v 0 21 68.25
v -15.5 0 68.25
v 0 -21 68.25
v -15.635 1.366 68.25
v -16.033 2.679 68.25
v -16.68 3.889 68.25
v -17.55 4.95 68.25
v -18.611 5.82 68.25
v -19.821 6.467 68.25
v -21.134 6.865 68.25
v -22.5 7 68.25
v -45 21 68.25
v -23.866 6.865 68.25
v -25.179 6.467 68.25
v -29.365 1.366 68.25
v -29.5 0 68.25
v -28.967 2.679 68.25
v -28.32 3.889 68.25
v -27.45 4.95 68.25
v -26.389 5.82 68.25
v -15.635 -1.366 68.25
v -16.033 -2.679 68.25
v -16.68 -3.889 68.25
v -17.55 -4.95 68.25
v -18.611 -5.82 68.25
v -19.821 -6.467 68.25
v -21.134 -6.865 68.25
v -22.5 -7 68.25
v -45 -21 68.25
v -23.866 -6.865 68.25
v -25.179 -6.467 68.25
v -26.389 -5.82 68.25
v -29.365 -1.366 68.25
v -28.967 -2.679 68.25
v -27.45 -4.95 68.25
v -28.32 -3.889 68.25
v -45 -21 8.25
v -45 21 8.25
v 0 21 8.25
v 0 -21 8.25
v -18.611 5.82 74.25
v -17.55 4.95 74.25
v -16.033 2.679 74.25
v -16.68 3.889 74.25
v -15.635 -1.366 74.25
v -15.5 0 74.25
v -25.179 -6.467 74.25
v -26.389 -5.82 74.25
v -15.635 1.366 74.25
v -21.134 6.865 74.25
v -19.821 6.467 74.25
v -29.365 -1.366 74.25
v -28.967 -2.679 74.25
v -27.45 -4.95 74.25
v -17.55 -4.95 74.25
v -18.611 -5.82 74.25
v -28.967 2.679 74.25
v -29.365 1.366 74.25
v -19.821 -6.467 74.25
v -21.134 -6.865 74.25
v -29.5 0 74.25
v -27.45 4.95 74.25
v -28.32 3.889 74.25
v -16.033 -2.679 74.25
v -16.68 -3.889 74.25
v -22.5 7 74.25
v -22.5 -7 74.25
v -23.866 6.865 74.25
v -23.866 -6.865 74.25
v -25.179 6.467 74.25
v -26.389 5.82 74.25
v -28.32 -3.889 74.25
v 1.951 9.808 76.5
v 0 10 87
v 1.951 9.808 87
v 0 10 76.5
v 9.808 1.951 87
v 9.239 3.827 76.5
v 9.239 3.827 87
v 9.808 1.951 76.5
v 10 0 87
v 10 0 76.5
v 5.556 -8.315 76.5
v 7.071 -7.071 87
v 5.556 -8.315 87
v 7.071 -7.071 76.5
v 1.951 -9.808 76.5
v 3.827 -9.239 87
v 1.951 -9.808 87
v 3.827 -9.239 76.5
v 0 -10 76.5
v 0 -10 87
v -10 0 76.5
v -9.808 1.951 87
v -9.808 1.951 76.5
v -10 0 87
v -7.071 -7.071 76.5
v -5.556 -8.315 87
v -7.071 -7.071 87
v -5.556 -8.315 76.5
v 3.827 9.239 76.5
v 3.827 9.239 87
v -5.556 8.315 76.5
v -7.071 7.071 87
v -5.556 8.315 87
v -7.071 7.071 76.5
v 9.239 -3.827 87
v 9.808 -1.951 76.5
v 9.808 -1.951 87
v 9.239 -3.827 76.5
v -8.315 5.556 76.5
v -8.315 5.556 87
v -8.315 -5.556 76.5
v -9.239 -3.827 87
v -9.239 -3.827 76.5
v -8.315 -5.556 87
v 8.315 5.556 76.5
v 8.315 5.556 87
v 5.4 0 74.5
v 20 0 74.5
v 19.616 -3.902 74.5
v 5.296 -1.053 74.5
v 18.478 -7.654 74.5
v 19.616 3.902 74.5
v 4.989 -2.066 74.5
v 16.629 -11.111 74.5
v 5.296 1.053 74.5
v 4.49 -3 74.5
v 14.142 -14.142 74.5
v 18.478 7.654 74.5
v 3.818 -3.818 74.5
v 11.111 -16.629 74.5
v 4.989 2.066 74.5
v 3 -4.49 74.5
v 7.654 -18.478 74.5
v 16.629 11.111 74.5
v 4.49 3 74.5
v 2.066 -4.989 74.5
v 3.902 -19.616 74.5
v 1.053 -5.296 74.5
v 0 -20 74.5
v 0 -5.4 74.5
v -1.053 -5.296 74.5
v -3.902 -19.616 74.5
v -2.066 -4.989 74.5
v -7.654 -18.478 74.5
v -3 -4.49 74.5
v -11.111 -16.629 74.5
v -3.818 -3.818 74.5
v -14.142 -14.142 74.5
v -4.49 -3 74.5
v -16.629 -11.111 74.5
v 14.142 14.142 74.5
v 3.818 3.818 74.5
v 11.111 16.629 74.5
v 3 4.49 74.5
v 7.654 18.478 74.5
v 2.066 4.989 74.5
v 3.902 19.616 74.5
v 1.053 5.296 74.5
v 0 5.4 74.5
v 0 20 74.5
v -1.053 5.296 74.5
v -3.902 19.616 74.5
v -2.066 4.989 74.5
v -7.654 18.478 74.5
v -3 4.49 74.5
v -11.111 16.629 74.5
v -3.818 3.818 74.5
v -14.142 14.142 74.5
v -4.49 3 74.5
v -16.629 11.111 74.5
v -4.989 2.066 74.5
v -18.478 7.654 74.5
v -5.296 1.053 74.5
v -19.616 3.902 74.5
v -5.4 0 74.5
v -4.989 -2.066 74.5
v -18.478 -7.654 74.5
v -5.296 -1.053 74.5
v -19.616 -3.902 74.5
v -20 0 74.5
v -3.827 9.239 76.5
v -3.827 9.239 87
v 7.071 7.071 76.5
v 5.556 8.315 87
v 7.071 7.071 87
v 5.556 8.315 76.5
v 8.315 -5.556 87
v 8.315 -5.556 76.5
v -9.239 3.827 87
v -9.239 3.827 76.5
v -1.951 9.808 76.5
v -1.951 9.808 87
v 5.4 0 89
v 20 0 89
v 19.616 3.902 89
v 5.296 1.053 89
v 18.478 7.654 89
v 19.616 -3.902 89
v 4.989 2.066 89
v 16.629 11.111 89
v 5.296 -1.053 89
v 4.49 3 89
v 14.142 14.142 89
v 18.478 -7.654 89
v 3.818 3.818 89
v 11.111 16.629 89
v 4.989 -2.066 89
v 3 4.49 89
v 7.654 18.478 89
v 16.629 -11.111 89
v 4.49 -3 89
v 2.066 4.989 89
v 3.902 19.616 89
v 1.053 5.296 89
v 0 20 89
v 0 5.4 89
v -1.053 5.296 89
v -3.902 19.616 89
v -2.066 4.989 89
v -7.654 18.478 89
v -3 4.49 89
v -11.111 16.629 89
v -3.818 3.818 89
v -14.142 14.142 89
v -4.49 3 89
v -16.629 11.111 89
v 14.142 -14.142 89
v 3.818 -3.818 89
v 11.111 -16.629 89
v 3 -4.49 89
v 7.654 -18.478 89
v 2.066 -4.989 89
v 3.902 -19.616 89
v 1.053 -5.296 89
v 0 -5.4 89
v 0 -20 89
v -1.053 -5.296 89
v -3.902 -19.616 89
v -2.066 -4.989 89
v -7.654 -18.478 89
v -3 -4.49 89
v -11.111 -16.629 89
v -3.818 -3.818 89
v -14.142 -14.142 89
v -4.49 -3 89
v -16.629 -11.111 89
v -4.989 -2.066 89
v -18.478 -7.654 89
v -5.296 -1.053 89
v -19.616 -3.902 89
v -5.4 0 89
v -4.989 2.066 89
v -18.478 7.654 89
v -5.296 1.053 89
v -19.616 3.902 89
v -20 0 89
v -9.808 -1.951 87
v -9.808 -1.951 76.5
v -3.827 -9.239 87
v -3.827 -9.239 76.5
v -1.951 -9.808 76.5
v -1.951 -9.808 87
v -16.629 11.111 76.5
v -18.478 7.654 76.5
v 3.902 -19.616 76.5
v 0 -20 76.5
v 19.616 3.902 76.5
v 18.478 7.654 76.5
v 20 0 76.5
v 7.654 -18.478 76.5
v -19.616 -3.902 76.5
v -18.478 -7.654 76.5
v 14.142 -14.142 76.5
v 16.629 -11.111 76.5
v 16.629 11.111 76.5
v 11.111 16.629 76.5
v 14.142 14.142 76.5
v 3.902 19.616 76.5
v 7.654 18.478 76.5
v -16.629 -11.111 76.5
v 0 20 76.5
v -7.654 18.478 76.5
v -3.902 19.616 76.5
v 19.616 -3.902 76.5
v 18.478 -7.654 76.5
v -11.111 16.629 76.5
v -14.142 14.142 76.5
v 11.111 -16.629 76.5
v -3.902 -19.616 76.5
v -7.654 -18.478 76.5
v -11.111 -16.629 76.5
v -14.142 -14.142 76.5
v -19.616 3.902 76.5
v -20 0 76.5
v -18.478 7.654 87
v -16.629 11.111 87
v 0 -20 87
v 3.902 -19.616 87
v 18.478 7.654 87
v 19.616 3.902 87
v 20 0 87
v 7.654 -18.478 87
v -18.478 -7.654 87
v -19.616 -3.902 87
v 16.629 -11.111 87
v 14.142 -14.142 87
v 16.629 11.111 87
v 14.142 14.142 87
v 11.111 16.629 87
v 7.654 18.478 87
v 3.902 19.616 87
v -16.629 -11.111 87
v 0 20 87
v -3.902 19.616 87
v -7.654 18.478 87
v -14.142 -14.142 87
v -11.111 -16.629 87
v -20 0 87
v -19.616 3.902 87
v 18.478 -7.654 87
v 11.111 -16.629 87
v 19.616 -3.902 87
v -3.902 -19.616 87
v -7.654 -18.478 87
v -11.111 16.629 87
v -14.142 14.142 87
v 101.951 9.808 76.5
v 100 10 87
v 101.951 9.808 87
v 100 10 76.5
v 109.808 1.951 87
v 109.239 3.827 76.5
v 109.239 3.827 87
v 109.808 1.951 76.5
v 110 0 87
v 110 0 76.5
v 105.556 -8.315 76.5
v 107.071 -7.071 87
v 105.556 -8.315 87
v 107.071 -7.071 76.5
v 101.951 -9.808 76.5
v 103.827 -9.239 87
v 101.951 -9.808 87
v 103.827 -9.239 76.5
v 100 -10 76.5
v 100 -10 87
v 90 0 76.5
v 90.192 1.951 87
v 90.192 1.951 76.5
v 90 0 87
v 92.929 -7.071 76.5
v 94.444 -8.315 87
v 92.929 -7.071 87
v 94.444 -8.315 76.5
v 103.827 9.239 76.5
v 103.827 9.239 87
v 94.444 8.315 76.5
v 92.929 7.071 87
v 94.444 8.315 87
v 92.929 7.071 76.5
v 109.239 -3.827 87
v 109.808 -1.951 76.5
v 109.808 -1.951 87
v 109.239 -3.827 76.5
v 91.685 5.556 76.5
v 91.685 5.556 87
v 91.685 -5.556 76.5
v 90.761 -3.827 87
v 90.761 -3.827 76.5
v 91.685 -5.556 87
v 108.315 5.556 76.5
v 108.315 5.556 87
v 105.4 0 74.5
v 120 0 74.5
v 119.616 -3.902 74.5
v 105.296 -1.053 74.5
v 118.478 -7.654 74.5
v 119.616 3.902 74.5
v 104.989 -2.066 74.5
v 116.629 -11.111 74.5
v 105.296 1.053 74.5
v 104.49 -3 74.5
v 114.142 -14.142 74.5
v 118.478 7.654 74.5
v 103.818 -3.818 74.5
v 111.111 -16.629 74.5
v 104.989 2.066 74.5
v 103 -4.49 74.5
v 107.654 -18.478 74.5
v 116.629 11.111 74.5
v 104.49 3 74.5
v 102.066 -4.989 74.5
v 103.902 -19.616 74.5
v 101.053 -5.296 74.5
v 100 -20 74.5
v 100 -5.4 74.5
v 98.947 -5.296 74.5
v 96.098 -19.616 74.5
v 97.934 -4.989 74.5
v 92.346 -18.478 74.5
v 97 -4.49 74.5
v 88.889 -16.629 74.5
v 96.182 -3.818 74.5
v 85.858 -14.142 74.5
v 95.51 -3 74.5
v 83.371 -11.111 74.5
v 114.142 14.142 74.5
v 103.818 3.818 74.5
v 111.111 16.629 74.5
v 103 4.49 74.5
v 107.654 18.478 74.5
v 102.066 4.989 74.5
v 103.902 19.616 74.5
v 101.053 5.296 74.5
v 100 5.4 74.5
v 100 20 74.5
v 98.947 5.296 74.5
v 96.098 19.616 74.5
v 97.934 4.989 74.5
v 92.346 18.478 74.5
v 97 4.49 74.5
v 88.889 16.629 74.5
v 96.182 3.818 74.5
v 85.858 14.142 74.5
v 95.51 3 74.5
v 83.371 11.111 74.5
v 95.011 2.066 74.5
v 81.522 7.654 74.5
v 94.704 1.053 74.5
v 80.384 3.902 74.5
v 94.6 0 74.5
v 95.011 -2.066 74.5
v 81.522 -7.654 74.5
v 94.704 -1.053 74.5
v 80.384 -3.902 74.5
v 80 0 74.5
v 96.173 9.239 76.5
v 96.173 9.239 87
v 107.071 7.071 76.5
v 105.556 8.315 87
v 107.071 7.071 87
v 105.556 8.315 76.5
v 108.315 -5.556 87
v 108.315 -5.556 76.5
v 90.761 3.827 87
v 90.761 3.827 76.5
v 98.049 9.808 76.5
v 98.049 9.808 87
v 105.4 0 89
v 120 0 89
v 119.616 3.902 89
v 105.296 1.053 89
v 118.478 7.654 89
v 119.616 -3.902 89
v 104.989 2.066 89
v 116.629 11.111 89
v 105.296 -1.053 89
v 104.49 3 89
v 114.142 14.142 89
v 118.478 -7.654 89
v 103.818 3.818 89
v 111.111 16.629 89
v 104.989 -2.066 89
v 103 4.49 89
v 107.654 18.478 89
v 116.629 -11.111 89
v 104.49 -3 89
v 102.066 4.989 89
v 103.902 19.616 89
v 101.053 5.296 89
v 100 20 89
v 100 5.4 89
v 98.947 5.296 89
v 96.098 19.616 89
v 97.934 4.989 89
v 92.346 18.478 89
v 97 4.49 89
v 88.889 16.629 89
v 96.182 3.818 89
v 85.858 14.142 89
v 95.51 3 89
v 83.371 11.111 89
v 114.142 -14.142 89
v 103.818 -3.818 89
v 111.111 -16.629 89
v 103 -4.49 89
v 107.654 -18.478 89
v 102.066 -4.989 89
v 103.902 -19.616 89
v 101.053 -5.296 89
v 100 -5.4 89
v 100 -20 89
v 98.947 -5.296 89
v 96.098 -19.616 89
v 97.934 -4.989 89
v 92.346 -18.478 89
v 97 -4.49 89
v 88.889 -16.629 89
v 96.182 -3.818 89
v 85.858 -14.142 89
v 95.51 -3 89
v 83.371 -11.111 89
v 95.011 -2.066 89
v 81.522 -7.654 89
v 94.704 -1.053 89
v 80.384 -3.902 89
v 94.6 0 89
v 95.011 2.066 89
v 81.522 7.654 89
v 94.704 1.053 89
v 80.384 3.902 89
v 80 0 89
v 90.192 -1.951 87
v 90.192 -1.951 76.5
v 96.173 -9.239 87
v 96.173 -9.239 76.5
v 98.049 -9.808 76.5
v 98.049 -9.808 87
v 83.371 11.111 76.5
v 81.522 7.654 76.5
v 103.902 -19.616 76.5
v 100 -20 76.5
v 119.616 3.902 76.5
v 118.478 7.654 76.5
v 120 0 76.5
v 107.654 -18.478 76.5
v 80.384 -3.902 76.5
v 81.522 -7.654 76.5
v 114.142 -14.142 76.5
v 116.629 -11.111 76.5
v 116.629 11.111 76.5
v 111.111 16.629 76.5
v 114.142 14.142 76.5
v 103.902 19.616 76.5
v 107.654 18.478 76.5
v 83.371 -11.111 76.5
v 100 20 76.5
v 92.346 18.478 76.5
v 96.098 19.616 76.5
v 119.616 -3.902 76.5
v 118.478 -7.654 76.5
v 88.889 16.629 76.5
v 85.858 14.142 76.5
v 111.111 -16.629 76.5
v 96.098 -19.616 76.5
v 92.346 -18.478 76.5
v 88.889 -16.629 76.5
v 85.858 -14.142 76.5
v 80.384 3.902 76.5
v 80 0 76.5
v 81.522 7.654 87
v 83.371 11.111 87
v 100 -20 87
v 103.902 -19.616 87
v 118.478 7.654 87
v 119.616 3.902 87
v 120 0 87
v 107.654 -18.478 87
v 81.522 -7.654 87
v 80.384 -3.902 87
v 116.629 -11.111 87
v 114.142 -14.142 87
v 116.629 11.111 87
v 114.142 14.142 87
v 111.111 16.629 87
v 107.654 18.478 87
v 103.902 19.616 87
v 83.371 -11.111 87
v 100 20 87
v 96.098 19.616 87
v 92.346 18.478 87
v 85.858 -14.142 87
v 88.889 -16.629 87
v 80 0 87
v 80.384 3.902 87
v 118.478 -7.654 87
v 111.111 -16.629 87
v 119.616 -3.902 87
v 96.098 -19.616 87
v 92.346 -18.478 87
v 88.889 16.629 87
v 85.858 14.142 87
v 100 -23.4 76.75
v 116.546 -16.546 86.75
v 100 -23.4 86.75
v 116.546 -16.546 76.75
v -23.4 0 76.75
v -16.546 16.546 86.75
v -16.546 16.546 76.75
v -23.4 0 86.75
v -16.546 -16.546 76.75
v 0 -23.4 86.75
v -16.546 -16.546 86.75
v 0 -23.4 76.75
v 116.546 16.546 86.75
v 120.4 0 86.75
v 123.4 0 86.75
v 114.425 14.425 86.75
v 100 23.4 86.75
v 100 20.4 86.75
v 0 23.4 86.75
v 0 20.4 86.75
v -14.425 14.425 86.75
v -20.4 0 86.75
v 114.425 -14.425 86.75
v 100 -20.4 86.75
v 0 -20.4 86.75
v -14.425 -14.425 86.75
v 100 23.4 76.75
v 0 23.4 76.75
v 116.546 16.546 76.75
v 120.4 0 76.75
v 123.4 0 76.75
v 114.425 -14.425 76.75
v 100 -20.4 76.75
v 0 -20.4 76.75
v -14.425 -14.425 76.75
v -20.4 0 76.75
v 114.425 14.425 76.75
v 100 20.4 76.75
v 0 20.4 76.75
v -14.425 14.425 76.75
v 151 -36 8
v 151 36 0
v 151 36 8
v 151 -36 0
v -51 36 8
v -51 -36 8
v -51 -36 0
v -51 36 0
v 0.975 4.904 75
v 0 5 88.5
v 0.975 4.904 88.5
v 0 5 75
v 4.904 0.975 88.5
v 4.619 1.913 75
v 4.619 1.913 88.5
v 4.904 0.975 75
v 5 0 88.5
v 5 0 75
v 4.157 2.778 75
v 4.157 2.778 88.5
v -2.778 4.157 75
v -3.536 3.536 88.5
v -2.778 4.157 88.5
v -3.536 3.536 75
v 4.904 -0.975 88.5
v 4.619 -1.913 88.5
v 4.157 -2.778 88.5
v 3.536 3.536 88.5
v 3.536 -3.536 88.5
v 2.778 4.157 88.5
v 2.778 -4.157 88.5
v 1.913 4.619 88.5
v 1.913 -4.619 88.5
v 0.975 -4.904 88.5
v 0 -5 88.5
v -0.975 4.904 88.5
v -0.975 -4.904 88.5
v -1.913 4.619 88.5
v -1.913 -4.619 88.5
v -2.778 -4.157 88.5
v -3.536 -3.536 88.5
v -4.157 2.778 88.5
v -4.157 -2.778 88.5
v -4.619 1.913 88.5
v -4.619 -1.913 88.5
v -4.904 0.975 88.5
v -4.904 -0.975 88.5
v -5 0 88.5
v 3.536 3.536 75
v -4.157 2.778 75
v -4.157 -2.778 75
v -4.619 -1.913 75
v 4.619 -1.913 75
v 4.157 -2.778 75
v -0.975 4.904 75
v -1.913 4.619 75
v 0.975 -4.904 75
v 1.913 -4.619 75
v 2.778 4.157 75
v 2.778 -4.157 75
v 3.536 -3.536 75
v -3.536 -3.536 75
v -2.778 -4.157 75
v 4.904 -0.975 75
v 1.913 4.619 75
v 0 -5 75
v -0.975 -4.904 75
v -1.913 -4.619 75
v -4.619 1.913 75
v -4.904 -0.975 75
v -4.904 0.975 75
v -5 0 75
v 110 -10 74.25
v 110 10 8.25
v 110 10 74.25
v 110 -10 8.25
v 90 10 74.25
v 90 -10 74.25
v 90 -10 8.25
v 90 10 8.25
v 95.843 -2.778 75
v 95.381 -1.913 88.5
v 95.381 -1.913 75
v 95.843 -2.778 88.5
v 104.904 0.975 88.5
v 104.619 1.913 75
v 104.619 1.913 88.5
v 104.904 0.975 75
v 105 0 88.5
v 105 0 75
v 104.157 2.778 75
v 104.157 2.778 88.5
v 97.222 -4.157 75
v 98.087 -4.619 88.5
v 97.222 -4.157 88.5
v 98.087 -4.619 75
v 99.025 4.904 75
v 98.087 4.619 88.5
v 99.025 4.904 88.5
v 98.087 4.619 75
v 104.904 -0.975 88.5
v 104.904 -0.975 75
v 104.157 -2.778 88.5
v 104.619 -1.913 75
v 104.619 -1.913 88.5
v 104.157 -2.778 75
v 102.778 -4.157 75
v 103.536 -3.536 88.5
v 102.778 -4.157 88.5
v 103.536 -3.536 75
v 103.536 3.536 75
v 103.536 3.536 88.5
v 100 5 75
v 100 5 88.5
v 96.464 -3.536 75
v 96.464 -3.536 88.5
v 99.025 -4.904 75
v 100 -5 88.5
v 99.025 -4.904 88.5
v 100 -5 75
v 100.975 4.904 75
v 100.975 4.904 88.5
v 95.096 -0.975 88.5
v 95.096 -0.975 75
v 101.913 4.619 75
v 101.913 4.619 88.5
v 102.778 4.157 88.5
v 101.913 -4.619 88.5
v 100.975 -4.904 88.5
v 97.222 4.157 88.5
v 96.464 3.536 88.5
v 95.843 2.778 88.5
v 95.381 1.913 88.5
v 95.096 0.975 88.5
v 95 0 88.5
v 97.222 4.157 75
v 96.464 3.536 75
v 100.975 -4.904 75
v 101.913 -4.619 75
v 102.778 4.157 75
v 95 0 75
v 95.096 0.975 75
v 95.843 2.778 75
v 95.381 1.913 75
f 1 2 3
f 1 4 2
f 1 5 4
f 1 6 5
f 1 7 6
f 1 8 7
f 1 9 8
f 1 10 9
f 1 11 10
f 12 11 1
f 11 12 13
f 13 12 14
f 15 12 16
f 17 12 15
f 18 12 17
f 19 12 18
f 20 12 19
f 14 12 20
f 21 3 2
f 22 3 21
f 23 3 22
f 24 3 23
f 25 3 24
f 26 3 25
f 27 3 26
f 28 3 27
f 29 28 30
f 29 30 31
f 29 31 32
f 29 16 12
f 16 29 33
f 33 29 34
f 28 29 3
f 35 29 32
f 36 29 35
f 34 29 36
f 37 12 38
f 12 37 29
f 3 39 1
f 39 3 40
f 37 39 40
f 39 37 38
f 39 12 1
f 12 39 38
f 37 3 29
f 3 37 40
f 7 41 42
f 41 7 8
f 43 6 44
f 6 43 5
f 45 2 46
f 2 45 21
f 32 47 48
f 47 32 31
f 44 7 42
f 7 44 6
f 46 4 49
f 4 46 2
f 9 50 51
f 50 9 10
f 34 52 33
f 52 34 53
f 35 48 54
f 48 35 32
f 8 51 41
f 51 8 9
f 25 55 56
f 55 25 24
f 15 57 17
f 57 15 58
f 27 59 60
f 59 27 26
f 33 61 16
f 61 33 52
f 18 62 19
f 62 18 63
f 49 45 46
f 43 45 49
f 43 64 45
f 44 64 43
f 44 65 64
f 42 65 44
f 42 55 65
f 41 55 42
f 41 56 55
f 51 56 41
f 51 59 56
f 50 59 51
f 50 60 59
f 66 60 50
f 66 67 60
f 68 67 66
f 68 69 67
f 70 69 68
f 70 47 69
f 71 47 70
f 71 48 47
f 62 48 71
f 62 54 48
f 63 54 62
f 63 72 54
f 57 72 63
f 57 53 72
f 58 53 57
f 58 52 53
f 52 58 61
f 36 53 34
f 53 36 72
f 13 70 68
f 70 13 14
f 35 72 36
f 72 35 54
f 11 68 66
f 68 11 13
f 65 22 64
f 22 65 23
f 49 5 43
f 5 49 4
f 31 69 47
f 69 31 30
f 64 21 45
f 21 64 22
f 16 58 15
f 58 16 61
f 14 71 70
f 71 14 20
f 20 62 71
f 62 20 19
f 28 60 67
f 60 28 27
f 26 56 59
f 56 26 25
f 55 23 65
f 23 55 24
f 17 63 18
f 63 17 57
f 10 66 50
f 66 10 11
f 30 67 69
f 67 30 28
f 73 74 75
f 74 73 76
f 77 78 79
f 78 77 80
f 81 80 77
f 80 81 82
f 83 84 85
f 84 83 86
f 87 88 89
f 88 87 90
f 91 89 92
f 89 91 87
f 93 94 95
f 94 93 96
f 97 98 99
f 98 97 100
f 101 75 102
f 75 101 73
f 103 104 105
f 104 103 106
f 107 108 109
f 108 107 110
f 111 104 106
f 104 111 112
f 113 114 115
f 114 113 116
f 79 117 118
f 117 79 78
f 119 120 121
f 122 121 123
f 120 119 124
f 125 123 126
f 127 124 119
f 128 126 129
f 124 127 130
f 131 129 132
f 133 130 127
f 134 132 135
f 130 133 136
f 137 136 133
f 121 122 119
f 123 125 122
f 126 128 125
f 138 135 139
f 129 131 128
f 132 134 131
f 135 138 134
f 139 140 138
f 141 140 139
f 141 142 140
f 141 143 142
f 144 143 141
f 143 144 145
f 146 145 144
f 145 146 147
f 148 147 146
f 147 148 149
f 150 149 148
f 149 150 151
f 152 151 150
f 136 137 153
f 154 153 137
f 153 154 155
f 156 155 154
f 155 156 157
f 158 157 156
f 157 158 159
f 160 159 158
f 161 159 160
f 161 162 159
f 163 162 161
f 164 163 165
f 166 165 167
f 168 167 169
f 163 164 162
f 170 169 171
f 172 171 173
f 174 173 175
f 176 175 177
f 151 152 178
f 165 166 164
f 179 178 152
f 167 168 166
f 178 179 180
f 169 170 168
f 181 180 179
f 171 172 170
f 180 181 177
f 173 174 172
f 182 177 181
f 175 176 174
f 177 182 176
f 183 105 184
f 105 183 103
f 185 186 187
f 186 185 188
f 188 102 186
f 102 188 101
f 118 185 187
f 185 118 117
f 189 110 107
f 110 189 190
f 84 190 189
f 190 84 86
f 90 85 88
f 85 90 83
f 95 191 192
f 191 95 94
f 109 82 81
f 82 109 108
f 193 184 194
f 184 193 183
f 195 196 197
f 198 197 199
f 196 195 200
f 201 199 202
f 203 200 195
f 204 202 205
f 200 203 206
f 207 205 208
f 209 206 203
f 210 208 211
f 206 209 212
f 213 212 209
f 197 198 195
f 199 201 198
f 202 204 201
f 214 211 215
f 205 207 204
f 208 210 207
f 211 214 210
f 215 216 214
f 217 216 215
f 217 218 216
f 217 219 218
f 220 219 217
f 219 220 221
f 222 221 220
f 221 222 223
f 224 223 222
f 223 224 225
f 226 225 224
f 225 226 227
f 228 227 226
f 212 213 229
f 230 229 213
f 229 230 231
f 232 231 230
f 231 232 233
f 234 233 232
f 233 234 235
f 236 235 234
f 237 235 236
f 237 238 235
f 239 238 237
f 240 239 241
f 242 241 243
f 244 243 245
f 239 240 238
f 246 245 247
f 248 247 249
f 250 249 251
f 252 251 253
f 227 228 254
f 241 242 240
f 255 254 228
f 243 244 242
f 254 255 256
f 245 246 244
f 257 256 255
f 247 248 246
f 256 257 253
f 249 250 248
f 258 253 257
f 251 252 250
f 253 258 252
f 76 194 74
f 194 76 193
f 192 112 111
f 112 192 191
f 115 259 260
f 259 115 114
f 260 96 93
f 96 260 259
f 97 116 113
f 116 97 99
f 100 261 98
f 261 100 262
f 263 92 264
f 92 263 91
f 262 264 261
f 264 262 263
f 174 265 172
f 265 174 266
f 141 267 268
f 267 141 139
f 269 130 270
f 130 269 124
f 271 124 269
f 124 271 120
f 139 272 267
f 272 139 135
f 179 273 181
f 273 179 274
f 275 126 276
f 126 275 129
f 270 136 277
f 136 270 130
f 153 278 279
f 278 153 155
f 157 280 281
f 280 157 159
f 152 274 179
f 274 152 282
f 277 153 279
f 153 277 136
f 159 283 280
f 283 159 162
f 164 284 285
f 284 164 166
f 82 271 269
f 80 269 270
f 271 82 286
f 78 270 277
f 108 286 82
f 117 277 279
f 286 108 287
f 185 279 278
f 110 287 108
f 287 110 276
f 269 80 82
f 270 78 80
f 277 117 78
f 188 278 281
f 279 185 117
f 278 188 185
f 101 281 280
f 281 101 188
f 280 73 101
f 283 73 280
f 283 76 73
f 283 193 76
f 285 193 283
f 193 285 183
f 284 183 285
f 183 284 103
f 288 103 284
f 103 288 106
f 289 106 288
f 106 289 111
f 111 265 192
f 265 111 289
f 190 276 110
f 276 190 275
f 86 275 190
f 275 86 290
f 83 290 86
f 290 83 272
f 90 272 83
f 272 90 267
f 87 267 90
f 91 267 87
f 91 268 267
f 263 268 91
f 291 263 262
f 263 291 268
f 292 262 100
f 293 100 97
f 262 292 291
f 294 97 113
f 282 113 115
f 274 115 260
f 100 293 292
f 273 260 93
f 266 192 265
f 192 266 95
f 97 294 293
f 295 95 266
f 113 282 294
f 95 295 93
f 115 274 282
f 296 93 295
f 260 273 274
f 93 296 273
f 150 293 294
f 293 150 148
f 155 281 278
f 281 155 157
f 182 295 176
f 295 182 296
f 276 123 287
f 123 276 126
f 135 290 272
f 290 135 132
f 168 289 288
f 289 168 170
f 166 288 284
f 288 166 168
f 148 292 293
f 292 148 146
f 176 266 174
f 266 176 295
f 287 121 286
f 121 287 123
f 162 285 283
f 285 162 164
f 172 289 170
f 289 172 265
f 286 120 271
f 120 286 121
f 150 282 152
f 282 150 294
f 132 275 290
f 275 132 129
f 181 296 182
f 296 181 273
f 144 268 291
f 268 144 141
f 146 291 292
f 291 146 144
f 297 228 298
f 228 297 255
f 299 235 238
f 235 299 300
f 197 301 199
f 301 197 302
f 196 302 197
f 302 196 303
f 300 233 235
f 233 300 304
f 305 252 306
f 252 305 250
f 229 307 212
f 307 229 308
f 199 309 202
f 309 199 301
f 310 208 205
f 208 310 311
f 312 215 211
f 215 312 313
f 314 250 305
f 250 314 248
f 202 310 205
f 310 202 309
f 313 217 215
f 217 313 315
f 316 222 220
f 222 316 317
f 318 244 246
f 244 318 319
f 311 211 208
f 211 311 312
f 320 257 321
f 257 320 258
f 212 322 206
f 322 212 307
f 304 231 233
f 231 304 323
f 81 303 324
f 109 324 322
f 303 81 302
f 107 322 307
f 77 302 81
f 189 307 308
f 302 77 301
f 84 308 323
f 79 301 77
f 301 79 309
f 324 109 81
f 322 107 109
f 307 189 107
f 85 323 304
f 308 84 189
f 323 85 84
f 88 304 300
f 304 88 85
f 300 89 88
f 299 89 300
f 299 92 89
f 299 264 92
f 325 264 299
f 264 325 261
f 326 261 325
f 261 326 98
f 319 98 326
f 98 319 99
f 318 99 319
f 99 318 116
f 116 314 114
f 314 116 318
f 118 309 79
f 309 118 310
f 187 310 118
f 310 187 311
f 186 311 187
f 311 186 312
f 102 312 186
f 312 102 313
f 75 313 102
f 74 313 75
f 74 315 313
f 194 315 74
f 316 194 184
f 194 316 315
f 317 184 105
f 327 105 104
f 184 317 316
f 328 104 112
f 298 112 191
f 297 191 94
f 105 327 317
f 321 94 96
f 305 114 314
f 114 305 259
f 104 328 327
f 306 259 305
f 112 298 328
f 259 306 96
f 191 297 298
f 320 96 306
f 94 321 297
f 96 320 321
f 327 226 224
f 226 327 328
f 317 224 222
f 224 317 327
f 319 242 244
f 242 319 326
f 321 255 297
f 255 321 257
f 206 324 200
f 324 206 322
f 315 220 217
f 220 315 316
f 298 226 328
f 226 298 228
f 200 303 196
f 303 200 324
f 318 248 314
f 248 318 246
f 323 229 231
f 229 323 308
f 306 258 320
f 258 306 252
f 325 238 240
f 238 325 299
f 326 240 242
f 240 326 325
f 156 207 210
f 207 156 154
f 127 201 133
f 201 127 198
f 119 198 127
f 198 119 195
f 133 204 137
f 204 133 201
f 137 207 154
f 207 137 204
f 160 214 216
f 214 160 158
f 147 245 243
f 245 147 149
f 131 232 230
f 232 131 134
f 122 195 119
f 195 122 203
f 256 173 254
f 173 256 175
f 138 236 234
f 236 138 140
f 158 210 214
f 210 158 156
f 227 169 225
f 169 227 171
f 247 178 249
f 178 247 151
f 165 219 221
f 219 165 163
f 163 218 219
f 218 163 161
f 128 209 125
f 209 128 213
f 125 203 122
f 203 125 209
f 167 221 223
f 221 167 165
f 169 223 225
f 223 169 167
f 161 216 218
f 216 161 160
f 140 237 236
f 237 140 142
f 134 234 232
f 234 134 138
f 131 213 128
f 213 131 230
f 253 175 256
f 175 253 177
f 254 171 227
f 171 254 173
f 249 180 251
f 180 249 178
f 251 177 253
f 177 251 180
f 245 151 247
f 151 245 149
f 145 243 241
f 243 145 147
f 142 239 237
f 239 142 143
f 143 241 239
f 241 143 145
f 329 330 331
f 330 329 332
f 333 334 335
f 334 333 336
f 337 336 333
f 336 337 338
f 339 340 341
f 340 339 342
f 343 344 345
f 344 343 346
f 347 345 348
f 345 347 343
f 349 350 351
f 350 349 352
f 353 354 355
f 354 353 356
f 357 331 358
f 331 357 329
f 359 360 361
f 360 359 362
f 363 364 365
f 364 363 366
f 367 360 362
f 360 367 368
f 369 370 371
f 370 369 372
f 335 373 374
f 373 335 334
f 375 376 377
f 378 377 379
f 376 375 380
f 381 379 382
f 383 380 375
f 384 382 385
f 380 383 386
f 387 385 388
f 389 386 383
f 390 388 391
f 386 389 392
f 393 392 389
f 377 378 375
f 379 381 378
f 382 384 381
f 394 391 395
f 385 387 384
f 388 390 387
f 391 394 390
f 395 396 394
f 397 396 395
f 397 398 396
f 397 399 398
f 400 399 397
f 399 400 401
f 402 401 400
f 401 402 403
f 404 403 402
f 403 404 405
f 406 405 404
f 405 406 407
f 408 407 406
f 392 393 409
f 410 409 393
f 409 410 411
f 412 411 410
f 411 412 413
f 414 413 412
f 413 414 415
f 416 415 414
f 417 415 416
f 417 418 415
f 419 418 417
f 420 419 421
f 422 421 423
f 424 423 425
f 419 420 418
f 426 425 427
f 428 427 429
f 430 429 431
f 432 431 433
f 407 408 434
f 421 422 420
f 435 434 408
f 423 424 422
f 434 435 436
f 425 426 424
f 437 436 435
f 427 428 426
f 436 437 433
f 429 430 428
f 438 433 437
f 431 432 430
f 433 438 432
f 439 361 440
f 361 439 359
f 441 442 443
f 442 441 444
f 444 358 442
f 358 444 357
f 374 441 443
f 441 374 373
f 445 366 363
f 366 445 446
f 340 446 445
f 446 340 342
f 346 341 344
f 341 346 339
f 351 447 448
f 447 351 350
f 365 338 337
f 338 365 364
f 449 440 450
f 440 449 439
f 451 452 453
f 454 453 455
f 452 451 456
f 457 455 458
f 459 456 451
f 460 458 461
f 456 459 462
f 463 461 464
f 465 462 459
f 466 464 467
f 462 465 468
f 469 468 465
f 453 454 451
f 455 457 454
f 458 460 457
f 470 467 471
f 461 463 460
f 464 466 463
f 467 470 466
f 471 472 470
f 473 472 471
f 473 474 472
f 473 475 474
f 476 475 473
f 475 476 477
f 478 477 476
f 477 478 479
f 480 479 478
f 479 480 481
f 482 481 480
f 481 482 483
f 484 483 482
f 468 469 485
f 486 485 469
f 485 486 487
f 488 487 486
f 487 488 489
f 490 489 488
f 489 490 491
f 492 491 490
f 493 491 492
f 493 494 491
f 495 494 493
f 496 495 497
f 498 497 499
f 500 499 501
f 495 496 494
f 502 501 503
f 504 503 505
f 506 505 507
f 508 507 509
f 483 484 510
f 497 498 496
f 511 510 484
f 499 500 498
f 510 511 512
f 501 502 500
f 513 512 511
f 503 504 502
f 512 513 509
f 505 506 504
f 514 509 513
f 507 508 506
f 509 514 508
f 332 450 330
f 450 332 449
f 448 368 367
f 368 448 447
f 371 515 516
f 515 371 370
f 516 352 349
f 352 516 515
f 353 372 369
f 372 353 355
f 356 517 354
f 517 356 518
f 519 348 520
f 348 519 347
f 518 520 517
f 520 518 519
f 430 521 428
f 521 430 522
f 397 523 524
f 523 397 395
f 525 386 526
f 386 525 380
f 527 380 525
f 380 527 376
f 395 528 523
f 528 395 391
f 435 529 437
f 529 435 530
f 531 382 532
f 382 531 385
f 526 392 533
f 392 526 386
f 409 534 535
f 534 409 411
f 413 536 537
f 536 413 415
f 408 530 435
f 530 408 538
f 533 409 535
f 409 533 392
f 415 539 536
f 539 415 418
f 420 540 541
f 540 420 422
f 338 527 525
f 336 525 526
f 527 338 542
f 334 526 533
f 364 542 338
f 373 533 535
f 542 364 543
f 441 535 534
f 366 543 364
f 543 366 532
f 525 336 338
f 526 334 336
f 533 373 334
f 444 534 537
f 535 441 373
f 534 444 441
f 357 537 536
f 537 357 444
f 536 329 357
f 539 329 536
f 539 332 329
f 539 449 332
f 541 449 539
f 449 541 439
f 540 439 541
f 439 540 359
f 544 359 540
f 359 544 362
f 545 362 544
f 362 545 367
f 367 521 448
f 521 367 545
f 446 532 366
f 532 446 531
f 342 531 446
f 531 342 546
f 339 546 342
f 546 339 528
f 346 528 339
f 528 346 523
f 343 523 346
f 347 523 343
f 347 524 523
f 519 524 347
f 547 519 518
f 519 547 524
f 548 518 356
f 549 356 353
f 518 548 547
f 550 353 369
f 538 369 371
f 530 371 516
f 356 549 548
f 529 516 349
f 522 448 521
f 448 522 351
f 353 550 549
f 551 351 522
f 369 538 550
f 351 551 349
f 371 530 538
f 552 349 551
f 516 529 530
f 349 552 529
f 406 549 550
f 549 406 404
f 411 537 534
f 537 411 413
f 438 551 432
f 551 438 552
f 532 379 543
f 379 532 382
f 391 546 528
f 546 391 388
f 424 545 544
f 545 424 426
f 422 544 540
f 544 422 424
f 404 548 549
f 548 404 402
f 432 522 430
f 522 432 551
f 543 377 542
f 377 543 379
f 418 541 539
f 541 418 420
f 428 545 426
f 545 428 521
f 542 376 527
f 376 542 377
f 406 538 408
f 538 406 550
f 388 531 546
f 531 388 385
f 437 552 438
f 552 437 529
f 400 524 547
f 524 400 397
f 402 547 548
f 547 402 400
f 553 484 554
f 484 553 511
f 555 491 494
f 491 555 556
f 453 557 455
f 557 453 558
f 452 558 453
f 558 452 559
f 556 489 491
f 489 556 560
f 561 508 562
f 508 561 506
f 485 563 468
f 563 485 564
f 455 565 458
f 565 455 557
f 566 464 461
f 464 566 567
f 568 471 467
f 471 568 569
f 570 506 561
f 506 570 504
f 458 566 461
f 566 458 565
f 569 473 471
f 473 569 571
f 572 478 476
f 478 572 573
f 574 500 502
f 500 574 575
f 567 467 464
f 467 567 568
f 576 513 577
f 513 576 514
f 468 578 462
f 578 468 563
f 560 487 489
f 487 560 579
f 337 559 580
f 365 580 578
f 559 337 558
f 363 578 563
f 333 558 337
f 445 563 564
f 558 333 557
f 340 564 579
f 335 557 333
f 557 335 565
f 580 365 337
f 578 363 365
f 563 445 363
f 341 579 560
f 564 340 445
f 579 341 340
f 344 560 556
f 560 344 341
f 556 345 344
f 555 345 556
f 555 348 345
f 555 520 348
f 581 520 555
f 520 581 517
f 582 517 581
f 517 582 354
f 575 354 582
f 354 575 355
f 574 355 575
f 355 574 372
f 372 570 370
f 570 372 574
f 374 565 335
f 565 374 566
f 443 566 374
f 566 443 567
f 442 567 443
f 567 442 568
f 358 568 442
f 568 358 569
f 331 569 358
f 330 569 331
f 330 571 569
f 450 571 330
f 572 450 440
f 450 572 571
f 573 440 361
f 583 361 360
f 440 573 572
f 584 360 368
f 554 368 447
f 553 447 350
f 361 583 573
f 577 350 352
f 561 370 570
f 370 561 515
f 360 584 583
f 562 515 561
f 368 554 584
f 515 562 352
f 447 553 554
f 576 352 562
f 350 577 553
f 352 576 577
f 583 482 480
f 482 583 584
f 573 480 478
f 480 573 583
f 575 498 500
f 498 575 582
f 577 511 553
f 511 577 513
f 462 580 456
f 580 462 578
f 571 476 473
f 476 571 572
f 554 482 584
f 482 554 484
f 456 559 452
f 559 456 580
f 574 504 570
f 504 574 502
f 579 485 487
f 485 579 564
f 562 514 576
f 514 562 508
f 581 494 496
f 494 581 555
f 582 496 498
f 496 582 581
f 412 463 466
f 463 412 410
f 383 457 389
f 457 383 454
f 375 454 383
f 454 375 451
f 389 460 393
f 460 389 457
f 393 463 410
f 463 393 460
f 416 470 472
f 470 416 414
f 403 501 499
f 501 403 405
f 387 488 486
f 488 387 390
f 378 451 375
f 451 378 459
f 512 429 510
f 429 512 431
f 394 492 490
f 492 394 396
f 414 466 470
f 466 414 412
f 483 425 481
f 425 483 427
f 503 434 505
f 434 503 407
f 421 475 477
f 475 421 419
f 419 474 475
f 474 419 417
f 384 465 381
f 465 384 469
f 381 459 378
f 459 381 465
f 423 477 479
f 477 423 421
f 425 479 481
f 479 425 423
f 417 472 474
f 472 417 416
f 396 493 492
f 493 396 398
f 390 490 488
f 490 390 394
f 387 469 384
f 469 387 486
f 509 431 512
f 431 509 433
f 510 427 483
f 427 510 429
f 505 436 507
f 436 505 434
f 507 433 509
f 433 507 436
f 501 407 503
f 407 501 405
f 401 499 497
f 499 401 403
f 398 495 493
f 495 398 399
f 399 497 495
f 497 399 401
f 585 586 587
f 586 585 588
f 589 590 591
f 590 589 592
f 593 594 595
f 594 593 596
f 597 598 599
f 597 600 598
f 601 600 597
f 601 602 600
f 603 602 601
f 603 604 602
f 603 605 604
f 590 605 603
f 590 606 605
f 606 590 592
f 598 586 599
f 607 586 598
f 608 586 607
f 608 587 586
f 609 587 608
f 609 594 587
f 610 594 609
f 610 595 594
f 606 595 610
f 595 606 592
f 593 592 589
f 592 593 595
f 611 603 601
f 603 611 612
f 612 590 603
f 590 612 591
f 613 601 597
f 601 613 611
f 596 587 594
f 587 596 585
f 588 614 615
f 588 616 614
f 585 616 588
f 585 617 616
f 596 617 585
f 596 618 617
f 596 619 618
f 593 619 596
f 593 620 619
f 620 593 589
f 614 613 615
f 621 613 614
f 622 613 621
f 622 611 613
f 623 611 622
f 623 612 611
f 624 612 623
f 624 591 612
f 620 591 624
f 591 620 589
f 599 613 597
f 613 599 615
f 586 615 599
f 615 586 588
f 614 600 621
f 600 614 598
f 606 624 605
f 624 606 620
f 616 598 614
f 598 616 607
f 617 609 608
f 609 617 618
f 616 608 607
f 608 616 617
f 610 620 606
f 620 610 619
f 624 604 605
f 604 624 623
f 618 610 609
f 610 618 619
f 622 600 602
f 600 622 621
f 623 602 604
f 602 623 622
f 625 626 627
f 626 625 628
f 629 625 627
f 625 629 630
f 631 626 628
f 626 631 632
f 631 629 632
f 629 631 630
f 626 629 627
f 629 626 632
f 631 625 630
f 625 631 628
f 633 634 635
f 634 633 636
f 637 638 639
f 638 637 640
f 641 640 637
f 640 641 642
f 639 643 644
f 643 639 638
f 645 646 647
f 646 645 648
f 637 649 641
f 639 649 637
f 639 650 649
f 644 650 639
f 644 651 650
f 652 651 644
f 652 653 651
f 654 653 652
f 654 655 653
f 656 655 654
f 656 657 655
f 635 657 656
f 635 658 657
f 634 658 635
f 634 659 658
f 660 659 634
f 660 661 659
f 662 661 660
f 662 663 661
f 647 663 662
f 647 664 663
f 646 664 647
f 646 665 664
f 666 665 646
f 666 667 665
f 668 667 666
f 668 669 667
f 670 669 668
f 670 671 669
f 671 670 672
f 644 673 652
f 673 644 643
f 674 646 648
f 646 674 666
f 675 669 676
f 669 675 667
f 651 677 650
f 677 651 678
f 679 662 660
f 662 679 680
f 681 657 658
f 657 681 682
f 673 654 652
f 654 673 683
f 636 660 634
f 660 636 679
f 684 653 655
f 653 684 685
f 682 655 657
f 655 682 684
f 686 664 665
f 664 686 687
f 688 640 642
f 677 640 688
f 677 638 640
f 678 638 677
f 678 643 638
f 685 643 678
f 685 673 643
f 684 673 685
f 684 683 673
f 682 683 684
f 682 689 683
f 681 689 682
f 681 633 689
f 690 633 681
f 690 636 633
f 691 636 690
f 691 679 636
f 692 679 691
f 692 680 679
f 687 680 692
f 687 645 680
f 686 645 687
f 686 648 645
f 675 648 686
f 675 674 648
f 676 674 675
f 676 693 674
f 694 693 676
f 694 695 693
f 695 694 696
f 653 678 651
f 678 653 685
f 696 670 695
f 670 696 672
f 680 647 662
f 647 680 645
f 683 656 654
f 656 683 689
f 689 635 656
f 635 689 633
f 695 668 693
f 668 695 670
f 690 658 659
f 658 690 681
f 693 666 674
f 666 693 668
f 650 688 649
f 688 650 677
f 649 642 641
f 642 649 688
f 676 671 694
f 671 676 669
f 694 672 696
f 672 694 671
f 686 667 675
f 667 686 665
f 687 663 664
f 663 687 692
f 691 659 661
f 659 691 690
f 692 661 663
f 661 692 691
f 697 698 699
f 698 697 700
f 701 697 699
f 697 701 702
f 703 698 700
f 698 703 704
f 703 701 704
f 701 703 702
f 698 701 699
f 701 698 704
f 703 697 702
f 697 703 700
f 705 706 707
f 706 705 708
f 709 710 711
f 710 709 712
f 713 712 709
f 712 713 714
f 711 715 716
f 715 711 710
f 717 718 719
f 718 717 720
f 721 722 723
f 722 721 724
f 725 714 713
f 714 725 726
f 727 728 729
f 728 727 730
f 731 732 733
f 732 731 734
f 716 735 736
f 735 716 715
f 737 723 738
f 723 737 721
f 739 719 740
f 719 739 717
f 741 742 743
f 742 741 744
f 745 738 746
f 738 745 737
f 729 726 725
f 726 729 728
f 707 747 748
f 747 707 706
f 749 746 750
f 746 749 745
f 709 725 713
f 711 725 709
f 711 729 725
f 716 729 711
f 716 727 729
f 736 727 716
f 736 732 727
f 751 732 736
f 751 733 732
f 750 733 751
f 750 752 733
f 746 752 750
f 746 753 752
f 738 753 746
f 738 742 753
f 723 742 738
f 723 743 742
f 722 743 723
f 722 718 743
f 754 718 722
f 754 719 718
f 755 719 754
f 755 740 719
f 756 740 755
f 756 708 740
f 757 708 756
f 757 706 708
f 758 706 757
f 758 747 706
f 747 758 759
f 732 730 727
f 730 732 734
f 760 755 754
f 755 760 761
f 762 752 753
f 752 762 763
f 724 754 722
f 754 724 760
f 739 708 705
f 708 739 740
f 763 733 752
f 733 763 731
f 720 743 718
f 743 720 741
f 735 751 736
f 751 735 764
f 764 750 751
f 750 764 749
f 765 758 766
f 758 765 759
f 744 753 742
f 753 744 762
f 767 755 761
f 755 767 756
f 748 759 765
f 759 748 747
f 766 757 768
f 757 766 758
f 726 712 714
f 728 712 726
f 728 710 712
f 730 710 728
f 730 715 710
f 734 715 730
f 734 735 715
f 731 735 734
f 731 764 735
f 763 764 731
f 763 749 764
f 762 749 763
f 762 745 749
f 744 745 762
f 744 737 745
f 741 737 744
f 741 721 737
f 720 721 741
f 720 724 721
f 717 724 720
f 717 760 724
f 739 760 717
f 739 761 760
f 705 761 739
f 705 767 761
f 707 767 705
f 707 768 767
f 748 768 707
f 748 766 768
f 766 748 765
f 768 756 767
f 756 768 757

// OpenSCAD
$fn = 32;

// ------------------------------------------------------------------------
// Motor belt drive: span 100 mm, pulleys d40, belt 10 mm wide
// Every part is its own module, assembly() places every instance.
// ------------------------------------------------------------------------

// --- part 1 ---
module base_plate() {
  difference() {
    translate([-101, -36, 0]) cube([202, 72, 8]);
  }
}

// --- part 2 ---
module motor() {
  union() {
    translate([-30, -21, 0]) cube([60, 42, 45]);
    translate([33, 0, 22.5]) rotate([0, 90, 0]) cylinder(h = 6, d = 14, center = true);
  }
}

// --- part 3 ---
module drive_shaft() {
  translate([0, 0, -6.75]) cylinder(h = 13.5, d = 10);
}

// --- part 4 ---
module pulley_drive() {
  difference() {
    union() {
      cylinder(h = 14.5, d = 20);
      cylinder(h = 2, d = 40);
      translate([0, 0, 12.5]) cylinder(h = 2, d = 40);
    }
    translate([0, 0, -1]) cylinder(h = 16.5, d = 10.8);
  }
}

// --- part 5 ---
module idler_post() {
  translate([-10, -10, 0]) cube([20, 20, 66]);
}

// --- part 6 ---
module driven_shaft() {
  translate([0, 0, -6.75]) cylinder(h = 13.5, d = 10);
}

// --- part 7 ---
module pulley_driven() {
  difference() {
    union() {
      cylinder(h = 14.5, d = 20);
      cylinder(h = 2, d = 40);
      translate([0, 0, 12.5]) cylinder(h = 2, d = 40);
    }
    translate([0, 0, -1]) cylinder(h = 16.5, d = 10.8);
  }
}

// --- part 8 ---
module drive_belt() {
  difference() {
    linear_extrude(height = 10) polygon(points = concat([for (a = [90 : 45 : 270]) [23.4 * cos(a), 23.4 * sin(a)]], [for (a = [270 : 45 : 450]) [100 + 23.4 * cos(a), 23.4 * sin(a)]]));
    translate([0, 0, -1]) linear_extrude(height = 12) polygon(points = concat([for (a = [90 : 45 : 270]) [20.4 * cos(a), 20.4 * sin(a)]], [for (a = [270 : 45 : 450]) [100 + 20.4 * cos(a), 20.4 * sin(a)]]));
  }
}

// --- assembly ---
module assembly() {
  color([0.80, 0.24, 0.20]) translate([50, 0, 0]) rotate([0, 0, 0]) base_plate();
  color([0.20, 0.45, 0.75]) translate([0, 0, 38.25]) rotate([0, 270, 0]) motor();
  color([0.25, 0.62, 0.32]) translate([0, 0, 81.75]) rotate([0, 0, 0]) drive_shaft();
  color([0.92, 0.70, 0.18]) translate([0, 0, 74.5]) rotate([0, 0, 0]) pulley_drive();
  color([0.58, 0.35, 0.70]) translate([100, 0, 8.25]) rotate([0, 0, 0]) idler_post();
  color([0.16, 0.66, 0.66]) translate([100, 0, 81.75]) rotate([0, 0, 0]) driven_shaft();
  color([0.85, 0.48, 0.18]) translate([100, 0, 74.5]) rotate([0, 0, 0]) pulley_driven();
  color([0.55, 0.60, 0.65]) translate([0, 0, 76.75]) rotate([0, 0, 0]) drive_belt();
}

assembly();
